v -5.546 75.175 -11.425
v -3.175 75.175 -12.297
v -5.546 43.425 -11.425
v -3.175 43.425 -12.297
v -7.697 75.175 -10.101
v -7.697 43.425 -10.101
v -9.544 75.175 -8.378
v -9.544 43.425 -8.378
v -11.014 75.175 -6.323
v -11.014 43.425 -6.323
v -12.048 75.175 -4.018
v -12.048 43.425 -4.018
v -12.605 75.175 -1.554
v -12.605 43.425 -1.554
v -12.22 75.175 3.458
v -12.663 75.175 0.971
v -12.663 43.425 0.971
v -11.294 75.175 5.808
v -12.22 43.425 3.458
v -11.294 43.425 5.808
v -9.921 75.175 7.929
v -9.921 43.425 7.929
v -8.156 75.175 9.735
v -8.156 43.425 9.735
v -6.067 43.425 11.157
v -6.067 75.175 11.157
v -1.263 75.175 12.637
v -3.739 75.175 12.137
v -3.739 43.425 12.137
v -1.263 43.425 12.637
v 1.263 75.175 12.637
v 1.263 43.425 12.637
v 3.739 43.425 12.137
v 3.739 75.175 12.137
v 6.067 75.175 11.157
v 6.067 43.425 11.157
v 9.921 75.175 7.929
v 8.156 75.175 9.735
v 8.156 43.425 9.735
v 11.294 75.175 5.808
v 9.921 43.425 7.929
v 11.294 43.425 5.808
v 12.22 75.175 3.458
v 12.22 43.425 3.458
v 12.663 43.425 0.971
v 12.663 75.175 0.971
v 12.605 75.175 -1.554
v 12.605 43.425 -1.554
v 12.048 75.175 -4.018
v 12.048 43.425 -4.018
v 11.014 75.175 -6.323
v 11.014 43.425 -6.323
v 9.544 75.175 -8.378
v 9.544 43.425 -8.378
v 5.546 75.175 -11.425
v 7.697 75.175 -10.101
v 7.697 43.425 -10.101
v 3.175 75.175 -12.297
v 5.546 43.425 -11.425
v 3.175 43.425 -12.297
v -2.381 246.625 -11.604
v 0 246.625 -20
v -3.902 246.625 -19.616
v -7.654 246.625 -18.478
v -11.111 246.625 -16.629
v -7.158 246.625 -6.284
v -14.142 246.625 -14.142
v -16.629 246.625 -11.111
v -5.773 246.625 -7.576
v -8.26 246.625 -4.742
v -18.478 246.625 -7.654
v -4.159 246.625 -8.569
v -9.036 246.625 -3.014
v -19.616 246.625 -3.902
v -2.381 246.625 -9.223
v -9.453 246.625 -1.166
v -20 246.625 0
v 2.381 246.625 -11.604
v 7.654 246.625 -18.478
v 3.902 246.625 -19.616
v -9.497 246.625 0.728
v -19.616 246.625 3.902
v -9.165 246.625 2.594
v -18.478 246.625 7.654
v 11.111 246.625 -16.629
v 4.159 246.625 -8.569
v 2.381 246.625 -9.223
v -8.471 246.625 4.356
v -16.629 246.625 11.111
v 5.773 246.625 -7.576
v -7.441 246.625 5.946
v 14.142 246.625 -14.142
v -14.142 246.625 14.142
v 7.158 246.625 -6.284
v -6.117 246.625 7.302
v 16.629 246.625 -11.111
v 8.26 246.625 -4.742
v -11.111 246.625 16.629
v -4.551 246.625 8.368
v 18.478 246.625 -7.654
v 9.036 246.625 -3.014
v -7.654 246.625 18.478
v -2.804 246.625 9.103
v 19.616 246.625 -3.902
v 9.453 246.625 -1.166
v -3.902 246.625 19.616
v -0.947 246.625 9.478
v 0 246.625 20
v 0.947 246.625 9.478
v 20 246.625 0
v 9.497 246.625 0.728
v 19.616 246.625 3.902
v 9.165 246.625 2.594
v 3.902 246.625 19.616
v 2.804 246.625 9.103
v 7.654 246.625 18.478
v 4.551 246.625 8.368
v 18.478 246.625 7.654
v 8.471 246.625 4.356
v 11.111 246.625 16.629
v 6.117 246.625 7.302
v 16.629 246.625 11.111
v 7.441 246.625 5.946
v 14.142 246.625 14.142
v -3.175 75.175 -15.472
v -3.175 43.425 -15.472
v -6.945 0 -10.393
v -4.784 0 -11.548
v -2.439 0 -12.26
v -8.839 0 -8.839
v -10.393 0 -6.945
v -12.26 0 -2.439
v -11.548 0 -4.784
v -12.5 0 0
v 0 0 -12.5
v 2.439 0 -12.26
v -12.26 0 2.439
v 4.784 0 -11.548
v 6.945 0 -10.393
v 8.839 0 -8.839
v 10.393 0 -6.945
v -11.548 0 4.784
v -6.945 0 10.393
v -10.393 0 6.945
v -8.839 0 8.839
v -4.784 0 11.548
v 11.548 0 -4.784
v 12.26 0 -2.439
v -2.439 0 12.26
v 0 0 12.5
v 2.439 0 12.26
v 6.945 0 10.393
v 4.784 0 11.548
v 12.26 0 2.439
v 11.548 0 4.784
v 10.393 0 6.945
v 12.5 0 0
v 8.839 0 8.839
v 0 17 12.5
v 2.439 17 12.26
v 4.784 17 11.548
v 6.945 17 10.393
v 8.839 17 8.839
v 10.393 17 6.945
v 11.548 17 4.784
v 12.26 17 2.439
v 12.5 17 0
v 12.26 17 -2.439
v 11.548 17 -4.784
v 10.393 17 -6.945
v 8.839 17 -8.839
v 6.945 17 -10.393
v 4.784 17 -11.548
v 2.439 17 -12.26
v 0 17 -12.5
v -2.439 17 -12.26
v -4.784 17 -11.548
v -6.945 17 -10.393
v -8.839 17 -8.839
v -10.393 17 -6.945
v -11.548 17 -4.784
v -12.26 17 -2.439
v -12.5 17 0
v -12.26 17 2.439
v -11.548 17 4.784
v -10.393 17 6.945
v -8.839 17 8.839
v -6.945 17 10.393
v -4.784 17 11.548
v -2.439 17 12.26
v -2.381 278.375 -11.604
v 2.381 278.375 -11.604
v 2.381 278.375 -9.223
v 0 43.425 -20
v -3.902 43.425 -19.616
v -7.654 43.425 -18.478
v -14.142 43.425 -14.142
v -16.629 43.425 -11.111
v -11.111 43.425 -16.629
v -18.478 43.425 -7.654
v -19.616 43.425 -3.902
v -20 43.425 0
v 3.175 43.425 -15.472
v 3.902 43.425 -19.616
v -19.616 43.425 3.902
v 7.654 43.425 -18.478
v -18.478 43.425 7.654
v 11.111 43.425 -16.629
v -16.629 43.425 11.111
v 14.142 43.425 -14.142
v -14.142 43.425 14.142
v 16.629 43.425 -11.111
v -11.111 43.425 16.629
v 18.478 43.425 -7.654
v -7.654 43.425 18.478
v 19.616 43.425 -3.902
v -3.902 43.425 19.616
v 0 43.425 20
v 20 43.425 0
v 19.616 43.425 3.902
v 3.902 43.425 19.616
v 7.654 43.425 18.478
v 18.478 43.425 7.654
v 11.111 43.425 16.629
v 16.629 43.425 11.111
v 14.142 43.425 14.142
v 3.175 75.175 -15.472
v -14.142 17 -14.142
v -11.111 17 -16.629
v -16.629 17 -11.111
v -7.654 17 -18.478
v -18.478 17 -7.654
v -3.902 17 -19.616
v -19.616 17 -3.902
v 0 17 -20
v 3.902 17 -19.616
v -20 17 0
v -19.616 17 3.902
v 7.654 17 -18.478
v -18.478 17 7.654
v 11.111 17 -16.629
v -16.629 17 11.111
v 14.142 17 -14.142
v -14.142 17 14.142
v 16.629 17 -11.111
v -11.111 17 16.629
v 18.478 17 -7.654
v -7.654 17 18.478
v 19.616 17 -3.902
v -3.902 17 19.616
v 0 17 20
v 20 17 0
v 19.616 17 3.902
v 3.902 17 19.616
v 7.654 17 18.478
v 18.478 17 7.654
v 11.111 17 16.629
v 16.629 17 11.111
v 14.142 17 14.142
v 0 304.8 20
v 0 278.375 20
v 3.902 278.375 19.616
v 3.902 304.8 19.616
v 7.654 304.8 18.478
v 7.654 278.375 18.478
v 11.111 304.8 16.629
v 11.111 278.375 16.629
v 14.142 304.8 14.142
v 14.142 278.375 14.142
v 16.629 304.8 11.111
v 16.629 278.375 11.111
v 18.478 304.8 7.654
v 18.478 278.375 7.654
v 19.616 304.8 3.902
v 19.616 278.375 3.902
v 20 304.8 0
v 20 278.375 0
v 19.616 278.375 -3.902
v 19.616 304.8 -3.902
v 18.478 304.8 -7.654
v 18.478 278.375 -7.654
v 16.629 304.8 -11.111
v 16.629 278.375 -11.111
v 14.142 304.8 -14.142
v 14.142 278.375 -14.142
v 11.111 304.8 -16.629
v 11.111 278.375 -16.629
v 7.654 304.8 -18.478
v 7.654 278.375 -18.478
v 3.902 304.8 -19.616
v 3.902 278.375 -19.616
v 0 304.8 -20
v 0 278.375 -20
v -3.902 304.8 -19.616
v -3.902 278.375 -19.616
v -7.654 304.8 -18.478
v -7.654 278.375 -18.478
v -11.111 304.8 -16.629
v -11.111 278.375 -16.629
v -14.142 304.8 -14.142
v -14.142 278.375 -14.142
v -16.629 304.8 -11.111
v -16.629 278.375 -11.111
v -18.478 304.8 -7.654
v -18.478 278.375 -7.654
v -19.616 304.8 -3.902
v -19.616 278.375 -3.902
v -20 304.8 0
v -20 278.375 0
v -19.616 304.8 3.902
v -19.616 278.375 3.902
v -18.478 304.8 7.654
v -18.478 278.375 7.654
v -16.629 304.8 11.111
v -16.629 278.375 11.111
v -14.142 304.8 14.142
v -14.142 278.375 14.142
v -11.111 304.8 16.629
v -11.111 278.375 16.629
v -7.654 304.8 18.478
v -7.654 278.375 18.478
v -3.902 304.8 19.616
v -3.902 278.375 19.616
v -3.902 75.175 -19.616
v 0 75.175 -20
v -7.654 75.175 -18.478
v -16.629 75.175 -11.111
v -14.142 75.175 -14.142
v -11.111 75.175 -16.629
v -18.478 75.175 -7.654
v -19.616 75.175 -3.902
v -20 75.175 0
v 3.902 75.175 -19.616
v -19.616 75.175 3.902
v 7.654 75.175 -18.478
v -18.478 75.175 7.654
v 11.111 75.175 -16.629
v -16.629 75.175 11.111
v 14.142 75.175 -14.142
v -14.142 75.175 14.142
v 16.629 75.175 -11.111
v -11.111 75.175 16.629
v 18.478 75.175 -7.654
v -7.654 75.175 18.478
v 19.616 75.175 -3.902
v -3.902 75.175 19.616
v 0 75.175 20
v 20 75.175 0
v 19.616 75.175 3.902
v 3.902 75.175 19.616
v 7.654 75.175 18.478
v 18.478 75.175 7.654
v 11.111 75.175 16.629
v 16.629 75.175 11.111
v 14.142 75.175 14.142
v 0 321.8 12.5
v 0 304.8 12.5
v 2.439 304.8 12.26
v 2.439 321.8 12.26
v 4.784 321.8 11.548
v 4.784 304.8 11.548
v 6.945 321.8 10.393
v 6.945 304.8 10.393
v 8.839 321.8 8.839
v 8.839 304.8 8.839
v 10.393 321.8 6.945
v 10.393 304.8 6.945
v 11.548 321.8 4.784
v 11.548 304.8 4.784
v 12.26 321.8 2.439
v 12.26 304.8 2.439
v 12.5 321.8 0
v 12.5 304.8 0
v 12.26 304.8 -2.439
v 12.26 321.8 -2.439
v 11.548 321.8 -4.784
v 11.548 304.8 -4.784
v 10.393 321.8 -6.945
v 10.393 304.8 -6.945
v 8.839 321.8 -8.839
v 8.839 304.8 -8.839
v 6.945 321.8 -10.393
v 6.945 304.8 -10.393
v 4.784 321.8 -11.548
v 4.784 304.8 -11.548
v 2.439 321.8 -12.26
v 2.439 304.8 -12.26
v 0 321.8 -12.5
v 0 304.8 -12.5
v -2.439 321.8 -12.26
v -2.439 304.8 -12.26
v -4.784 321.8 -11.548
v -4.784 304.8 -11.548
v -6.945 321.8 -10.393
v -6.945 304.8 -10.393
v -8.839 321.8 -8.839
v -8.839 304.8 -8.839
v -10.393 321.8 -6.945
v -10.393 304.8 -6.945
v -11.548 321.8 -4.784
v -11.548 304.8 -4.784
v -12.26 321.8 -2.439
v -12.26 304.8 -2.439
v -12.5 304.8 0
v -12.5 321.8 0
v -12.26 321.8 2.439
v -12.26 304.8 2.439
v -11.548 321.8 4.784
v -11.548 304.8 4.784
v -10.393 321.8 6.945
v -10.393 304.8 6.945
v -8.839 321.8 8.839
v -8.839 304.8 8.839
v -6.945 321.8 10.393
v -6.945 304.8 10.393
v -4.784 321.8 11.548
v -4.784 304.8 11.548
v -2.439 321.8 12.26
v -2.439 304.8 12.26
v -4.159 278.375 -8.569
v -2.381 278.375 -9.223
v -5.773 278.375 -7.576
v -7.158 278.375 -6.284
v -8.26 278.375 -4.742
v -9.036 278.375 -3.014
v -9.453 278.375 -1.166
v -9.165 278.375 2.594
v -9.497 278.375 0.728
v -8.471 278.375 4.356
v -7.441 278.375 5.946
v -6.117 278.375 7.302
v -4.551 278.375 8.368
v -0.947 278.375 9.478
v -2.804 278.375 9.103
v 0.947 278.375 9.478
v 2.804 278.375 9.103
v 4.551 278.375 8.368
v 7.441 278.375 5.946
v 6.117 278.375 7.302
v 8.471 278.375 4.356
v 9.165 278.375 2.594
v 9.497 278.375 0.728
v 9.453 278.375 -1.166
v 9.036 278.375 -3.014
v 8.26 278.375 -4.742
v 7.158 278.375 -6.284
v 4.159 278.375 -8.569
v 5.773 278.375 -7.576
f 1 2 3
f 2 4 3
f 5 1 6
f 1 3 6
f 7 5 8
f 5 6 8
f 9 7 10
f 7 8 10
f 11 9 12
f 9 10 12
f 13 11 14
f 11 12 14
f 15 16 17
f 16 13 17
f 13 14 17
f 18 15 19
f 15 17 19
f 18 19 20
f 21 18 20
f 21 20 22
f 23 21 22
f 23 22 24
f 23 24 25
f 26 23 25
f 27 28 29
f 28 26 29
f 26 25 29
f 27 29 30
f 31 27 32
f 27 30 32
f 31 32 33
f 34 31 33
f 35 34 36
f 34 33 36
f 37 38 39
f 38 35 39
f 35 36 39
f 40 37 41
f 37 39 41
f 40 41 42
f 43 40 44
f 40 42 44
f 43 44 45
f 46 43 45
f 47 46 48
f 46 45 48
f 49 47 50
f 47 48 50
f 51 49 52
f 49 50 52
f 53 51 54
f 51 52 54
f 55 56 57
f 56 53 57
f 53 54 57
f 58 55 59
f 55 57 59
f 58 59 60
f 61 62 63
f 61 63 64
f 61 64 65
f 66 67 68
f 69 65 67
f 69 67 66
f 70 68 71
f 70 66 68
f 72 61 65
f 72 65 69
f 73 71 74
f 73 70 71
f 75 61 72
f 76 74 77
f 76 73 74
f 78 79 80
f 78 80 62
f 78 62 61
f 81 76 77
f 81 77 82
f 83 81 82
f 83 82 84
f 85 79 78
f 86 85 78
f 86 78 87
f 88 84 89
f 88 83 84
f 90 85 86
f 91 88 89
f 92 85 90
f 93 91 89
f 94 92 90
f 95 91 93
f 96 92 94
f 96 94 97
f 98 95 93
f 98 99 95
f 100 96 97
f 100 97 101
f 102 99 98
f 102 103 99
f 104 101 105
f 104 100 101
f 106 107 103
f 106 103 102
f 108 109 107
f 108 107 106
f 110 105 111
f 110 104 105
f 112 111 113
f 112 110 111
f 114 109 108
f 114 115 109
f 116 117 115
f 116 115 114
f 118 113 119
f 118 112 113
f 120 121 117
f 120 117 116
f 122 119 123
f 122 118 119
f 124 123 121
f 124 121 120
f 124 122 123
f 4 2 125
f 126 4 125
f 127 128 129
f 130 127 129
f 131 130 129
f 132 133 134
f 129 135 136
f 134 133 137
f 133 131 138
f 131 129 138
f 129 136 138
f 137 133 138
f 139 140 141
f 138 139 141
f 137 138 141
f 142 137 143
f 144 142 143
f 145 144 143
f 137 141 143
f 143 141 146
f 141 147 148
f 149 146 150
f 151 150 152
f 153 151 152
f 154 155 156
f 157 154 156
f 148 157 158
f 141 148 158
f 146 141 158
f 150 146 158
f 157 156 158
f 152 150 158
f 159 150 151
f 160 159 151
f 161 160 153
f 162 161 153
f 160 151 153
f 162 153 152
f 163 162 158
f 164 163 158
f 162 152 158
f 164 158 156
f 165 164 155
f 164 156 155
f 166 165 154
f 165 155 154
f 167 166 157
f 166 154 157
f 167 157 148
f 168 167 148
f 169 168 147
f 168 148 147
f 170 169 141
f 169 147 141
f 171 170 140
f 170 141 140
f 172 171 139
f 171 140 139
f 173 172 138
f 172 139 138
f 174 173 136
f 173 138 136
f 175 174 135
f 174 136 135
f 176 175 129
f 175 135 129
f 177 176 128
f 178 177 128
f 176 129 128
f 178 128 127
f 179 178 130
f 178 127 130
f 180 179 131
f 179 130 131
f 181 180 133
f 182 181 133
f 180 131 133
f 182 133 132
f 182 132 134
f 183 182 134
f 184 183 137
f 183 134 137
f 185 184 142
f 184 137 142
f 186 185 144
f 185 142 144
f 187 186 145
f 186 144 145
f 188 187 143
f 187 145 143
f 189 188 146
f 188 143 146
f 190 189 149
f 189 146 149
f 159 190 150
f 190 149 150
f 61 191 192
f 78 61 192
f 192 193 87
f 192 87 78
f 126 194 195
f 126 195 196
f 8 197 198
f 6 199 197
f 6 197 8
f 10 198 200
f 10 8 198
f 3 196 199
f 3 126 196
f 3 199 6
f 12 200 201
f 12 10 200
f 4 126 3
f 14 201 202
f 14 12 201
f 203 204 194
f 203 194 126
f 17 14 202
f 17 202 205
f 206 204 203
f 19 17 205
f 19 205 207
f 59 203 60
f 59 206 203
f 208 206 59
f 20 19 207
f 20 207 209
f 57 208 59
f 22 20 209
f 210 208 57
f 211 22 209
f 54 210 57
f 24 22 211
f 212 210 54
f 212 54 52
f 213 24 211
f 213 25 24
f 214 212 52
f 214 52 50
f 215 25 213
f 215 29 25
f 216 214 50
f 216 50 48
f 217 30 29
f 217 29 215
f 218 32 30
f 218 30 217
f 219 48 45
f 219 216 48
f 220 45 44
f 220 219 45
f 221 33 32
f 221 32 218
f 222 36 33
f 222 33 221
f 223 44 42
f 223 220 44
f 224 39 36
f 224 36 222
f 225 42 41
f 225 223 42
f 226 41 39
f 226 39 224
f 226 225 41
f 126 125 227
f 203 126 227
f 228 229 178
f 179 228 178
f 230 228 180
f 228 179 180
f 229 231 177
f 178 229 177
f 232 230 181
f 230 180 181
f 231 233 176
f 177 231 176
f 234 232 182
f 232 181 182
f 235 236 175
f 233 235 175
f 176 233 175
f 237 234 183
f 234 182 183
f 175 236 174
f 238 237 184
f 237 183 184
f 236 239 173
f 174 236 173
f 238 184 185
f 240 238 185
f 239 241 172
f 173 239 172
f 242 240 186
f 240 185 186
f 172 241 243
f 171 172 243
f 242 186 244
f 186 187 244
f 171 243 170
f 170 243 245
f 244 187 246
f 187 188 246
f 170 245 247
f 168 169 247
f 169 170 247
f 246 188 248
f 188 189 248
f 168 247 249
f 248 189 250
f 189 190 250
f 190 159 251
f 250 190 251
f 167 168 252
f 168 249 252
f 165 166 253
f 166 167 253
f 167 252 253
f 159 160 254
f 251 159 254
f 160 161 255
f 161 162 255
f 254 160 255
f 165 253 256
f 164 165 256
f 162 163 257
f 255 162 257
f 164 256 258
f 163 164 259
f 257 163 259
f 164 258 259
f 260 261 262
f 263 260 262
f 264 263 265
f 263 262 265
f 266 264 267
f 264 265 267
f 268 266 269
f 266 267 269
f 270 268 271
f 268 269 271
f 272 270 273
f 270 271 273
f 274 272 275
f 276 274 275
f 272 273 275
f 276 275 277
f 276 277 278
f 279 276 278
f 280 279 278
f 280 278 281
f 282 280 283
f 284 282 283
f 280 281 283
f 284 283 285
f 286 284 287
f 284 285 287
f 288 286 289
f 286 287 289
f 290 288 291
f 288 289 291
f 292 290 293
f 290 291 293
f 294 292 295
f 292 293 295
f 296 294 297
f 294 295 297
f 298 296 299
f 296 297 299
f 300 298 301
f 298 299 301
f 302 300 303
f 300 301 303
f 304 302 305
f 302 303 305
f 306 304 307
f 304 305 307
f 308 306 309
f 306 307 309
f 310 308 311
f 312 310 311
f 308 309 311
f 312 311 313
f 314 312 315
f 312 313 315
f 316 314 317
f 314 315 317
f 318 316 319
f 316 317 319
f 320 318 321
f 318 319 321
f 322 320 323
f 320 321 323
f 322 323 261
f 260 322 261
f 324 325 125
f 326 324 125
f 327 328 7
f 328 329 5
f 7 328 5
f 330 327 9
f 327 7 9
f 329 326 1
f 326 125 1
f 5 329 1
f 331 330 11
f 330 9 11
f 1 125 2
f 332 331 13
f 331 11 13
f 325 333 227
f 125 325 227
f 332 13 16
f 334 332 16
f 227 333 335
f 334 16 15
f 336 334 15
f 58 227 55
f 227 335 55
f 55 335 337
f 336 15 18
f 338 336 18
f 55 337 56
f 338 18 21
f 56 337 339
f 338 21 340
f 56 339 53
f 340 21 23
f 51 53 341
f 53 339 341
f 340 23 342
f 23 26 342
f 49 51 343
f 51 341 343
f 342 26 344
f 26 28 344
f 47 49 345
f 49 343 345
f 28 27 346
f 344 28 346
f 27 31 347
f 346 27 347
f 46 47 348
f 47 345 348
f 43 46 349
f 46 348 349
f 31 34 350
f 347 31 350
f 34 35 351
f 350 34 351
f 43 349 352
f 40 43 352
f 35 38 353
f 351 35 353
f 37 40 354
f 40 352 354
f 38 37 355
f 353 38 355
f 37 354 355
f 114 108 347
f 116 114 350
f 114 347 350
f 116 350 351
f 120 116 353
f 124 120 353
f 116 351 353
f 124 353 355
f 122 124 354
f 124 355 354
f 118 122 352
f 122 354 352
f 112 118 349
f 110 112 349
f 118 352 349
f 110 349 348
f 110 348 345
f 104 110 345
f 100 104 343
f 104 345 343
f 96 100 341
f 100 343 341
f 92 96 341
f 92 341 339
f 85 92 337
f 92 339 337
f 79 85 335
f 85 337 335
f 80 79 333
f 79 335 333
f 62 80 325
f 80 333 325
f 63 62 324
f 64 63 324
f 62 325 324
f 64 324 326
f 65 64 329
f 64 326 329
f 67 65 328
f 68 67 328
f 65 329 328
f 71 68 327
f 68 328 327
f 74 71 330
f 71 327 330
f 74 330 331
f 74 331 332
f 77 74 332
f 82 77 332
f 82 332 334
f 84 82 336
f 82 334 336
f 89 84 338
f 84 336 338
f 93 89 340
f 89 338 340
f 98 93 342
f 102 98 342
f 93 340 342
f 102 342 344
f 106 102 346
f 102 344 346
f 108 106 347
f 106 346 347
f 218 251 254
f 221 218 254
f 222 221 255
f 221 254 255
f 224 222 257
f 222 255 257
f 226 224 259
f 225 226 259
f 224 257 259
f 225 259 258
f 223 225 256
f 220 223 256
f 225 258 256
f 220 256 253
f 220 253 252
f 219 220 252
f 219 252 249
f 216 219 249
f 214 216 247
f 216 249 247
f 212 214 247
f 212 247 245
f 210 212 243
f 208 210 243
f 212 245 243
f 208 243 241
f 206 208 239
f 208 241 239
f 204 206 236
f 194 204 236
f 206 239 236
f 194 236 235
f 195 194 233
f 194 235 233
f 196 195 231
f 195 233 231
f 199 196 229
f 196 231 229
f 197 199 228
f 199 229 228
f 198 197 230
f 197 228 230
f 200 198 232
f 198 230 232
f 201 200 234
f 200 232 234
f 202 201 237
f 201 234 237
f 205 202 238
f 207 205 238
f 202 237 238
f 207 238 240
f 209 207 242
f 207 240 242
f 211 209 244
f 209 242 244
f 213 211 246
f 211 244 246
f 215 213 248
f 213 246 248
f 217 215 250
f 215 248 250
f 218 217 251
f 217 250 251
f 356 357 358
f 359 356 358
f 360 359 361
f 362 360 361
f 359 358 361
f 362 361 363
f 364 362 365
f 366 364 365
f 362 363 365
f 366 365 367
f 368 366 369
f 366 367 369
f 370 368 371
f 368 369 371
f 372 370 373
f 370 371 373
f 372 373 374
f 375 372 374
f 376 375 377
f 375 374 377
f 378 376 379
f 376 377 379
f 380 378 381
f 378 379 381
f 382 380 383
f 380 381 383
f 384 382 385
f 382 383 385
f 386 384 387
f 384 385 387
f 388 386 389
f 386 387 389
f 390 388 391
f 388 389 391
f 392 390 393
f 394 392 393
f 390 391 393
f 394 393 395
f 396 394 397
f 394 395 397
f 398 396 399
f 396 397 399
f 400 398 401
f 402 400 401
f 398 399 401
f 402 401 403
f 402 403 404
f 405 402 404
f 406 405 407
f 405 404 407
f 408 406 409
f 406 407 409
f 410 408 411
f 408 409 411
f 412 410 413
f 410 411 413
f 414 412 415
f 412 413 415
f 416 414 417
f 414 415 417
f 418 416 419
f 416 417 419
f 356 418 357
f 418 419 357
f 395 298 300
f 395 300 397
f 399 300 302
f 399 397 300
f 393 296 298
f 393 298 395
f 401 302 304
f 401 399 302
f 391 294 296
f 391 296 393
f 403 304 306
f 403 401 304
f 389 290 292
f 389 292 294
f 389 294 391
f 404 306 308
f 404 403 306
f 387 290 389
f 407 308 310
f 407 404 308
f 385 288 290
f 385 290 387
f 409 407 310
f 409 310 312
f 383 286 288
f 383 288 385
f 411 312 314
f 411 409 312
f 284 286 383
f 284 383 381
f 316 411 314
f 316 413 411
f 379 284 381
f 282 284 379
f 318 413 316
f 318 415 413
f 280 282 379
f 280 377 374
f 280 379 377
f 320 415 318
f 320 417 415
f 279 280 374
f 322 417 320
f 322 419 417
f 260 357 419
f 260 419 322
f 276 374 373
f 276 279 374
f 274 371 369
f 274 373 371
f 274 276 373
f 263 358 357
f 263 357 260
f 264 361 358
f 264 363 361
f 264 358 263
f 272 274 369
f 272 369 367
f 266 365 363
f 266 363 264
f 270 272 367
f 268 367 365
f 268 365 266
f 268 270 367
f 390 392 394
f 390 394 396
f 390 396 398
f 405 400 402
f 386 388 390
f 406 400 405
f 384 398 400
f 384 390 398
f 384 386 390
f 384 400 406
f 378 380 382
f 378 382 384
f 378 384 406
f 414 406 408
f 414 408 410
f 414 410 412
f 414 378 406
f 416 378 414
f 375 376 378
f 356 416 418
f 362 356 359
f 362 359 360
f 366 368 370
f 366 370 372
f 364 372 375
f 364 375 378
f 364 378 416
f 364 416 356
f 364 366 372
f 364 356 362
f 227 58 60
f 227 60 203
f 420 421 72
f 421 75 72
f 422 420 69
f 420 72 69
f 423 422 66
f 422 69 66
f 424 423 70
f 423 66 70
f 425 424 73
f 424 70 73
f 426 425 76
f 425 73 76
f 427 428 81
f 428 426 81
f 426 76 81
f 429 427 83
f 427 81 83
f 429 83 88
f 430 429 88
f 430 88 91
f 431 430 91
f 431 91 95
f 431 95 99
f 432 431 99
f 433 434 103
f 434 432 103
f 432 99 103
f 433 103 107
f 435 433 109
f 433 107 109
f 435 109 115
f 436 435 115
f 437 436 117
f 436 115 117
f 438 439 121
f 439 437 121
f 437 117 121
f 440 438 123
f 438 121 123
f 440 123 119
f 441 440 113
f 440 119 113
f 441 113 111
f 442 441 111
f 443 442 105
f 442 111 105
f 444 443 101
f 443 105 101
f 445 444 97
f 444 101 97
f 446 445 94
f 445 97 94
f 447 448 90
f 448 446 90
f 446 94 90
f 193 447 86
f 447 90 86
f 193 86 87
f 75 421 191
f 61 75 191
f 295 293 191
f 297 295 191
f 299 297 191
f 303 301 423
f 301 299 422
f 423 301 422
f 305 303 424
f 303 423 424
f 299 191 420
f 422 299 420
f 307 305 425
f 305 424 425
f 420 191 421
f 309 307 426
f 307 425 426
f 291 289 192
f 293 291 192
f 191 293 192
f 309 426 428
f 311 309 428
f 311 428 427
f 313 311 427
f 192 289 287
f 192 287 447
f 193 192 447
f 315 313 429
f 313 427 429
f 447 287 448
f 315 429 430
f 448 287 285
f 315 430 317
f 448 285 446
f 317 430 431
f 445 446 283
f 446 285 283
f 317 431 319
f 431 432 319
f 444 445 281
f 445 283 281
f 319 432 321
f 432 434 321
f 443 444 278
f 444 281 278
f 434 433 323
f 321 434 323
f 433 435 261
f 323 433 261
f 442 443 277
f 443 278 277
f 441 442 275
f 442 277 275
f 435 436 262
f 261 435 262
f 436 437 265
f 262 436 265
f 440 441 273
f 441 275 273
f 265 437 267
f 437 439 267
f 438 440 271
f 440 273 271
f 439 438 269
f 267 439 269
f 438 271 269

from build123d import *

# Parameters (mm, degrees)
SKETCH1_R           = 12.5
BOSS_EXTRUDE1_DEPTH = 17
SKETCH2_R           = 20
BOSS_EXTRUDE2_DEPTH = 26.425
SKETCH3_R           = 12.7
BOSS_EXTRUDE3_DEPTH = 31.75
SKETCH8_W           = 6.35
SKETCH8_H           = 3.175
BOSS_EXTRUDE8_DEPTH = 31.75
SKETCH4_R           = 20
BOSS_EXTRUDE4_DEPTH = 171.45
SKETCH5_R           = 9.525
BOSS_EXTRUDE5_DEPTH = 31.75
SKETCH9_W           = 4.7625
SKETCH9_H           = 2.38125
BOSS_EXTRUDE9_DEPTH = 31.75
SKETCH6_R           = 20
BOSS_EXTRUDE6_DEPTH = 26.425
SKETCH7_R           = 12.5
BOSS_EXTRUDE7_DEPTH = 17


with BuildPart() as part:
    # Sketch1 → Boss-Extrude1 (new body)
    with BuildSketch(Plane(origin=(0, 0, 0), x_dir=(1, 0, 0), z_dir=(0, 1, 0))):
        with Locations(Location((0, 0, 0), (0, 0, 270))):
            Circle(SKETCH1_R)
    extrude(amount=BOSS_EXTRUDE1_DEPTH)

    # Sketch2 → Boss-Extrude2 (add)
    with BuildSketch(Plane(origin=(0, 17, 0), x_dir=(1, 0, 0), z_dir=(0, 1, 0))):
        with Locations(Location((0, 0, 0), (0, 0, 270))):
            Circle(SKETCH2_R)
    extrude(amount=BOSS_EXTRUDE2_DEPTH)

    # Sketch3 → Boss-Extrude3 (add)
    with BuildSketch(Plane(origin=(0, 43.425, 0), x_dir=(1, 0, 0), z_dir=(0, 1, 0))):
        with Locations(Location((0, 0, 0), (0, 0, 270))):
            Circle(SKETCH3_R)
    extrude(amount=BOSS_EXTRUDE3_DEPTH)

    # Sketch8 → Boss-Extrude8 (add)
    with BuildSketch(Plane(origin=(0, 75.175, 0), x_dir=(1, 0, 0), z_dir=(0, 1, 0))):
        with Locations((0, 13.884222124)):
            Rectangle(SKETCH8_W, SKETCH8_H)
    extrude(amount=-BOSS_EXTRUDE8_DEPTH)

    # Sketch4 → Boss-Extrude4 (add)
    with BuildSketch(Plane(origin=(0, 75.175, 0), x_dir=(1, 0, 0), z_dir=(0, 1, 0))):
        with Locations(Location((0, 0, 0), (0, 0, 270))):
            Circle(SKETCH4_R)
    extrude(amount=BOSS_EXTRUDE4_DEPTH)

    # Sketch5 → Boss-Extrude5 (add)
    with BuildSketch(Plane(origin=(0, 246.625, 0), x_dir=(1, 0, 0), z_dir=(0, 1, 0))):
        with Locations(Location((0, 0, 0), (0, 0, 270))):
            Circle(SKETCH5_R)
    extrude(amount=BOSS_EXTRUDE5_DEPTH)

    # Sketch9 → Boss-Extrude9 (add)
    with BuildSketch(Plane(origin=(0, 278.375, 0), x_dir=(1, 0, 0), z_dir=(0, 1, 0))):
        with Locations((0, 10.413166593)):
            Rectangle(SKETCH9_W, SKETCH9_H)
    extrude(amount=-BOSS_EXTRUDE9_DEPTH)

    # Sketch6 → Boss-Extrude6 (add)
    with BuildSketch(Plane(origin=(0, 278.375, 0), x_dir=(1, 0, 0), z_dir=(0, 1, 0))):
        with Locations(Location((0, 0, 0), (0, 0, 270))):
            Circle(SKETCH6_R)
    extrude(amount=BOSS_EXTRUDE6_DEPTH)

    # Sketch7 → Boss-Extrude7 (add)
    with BuildSketch(Plane(origin=(0, 304.8, 0), x_dir=(1, 0, 0), z_dir=(0, 1, 0))):
        with Locations(Location((0, 0, 0), (0, 0, 270))):
            Circle(SKETCH7_R)
    extrude(amount=BOSS_EXTRUDE7_DEPTH)


solid = part.part
